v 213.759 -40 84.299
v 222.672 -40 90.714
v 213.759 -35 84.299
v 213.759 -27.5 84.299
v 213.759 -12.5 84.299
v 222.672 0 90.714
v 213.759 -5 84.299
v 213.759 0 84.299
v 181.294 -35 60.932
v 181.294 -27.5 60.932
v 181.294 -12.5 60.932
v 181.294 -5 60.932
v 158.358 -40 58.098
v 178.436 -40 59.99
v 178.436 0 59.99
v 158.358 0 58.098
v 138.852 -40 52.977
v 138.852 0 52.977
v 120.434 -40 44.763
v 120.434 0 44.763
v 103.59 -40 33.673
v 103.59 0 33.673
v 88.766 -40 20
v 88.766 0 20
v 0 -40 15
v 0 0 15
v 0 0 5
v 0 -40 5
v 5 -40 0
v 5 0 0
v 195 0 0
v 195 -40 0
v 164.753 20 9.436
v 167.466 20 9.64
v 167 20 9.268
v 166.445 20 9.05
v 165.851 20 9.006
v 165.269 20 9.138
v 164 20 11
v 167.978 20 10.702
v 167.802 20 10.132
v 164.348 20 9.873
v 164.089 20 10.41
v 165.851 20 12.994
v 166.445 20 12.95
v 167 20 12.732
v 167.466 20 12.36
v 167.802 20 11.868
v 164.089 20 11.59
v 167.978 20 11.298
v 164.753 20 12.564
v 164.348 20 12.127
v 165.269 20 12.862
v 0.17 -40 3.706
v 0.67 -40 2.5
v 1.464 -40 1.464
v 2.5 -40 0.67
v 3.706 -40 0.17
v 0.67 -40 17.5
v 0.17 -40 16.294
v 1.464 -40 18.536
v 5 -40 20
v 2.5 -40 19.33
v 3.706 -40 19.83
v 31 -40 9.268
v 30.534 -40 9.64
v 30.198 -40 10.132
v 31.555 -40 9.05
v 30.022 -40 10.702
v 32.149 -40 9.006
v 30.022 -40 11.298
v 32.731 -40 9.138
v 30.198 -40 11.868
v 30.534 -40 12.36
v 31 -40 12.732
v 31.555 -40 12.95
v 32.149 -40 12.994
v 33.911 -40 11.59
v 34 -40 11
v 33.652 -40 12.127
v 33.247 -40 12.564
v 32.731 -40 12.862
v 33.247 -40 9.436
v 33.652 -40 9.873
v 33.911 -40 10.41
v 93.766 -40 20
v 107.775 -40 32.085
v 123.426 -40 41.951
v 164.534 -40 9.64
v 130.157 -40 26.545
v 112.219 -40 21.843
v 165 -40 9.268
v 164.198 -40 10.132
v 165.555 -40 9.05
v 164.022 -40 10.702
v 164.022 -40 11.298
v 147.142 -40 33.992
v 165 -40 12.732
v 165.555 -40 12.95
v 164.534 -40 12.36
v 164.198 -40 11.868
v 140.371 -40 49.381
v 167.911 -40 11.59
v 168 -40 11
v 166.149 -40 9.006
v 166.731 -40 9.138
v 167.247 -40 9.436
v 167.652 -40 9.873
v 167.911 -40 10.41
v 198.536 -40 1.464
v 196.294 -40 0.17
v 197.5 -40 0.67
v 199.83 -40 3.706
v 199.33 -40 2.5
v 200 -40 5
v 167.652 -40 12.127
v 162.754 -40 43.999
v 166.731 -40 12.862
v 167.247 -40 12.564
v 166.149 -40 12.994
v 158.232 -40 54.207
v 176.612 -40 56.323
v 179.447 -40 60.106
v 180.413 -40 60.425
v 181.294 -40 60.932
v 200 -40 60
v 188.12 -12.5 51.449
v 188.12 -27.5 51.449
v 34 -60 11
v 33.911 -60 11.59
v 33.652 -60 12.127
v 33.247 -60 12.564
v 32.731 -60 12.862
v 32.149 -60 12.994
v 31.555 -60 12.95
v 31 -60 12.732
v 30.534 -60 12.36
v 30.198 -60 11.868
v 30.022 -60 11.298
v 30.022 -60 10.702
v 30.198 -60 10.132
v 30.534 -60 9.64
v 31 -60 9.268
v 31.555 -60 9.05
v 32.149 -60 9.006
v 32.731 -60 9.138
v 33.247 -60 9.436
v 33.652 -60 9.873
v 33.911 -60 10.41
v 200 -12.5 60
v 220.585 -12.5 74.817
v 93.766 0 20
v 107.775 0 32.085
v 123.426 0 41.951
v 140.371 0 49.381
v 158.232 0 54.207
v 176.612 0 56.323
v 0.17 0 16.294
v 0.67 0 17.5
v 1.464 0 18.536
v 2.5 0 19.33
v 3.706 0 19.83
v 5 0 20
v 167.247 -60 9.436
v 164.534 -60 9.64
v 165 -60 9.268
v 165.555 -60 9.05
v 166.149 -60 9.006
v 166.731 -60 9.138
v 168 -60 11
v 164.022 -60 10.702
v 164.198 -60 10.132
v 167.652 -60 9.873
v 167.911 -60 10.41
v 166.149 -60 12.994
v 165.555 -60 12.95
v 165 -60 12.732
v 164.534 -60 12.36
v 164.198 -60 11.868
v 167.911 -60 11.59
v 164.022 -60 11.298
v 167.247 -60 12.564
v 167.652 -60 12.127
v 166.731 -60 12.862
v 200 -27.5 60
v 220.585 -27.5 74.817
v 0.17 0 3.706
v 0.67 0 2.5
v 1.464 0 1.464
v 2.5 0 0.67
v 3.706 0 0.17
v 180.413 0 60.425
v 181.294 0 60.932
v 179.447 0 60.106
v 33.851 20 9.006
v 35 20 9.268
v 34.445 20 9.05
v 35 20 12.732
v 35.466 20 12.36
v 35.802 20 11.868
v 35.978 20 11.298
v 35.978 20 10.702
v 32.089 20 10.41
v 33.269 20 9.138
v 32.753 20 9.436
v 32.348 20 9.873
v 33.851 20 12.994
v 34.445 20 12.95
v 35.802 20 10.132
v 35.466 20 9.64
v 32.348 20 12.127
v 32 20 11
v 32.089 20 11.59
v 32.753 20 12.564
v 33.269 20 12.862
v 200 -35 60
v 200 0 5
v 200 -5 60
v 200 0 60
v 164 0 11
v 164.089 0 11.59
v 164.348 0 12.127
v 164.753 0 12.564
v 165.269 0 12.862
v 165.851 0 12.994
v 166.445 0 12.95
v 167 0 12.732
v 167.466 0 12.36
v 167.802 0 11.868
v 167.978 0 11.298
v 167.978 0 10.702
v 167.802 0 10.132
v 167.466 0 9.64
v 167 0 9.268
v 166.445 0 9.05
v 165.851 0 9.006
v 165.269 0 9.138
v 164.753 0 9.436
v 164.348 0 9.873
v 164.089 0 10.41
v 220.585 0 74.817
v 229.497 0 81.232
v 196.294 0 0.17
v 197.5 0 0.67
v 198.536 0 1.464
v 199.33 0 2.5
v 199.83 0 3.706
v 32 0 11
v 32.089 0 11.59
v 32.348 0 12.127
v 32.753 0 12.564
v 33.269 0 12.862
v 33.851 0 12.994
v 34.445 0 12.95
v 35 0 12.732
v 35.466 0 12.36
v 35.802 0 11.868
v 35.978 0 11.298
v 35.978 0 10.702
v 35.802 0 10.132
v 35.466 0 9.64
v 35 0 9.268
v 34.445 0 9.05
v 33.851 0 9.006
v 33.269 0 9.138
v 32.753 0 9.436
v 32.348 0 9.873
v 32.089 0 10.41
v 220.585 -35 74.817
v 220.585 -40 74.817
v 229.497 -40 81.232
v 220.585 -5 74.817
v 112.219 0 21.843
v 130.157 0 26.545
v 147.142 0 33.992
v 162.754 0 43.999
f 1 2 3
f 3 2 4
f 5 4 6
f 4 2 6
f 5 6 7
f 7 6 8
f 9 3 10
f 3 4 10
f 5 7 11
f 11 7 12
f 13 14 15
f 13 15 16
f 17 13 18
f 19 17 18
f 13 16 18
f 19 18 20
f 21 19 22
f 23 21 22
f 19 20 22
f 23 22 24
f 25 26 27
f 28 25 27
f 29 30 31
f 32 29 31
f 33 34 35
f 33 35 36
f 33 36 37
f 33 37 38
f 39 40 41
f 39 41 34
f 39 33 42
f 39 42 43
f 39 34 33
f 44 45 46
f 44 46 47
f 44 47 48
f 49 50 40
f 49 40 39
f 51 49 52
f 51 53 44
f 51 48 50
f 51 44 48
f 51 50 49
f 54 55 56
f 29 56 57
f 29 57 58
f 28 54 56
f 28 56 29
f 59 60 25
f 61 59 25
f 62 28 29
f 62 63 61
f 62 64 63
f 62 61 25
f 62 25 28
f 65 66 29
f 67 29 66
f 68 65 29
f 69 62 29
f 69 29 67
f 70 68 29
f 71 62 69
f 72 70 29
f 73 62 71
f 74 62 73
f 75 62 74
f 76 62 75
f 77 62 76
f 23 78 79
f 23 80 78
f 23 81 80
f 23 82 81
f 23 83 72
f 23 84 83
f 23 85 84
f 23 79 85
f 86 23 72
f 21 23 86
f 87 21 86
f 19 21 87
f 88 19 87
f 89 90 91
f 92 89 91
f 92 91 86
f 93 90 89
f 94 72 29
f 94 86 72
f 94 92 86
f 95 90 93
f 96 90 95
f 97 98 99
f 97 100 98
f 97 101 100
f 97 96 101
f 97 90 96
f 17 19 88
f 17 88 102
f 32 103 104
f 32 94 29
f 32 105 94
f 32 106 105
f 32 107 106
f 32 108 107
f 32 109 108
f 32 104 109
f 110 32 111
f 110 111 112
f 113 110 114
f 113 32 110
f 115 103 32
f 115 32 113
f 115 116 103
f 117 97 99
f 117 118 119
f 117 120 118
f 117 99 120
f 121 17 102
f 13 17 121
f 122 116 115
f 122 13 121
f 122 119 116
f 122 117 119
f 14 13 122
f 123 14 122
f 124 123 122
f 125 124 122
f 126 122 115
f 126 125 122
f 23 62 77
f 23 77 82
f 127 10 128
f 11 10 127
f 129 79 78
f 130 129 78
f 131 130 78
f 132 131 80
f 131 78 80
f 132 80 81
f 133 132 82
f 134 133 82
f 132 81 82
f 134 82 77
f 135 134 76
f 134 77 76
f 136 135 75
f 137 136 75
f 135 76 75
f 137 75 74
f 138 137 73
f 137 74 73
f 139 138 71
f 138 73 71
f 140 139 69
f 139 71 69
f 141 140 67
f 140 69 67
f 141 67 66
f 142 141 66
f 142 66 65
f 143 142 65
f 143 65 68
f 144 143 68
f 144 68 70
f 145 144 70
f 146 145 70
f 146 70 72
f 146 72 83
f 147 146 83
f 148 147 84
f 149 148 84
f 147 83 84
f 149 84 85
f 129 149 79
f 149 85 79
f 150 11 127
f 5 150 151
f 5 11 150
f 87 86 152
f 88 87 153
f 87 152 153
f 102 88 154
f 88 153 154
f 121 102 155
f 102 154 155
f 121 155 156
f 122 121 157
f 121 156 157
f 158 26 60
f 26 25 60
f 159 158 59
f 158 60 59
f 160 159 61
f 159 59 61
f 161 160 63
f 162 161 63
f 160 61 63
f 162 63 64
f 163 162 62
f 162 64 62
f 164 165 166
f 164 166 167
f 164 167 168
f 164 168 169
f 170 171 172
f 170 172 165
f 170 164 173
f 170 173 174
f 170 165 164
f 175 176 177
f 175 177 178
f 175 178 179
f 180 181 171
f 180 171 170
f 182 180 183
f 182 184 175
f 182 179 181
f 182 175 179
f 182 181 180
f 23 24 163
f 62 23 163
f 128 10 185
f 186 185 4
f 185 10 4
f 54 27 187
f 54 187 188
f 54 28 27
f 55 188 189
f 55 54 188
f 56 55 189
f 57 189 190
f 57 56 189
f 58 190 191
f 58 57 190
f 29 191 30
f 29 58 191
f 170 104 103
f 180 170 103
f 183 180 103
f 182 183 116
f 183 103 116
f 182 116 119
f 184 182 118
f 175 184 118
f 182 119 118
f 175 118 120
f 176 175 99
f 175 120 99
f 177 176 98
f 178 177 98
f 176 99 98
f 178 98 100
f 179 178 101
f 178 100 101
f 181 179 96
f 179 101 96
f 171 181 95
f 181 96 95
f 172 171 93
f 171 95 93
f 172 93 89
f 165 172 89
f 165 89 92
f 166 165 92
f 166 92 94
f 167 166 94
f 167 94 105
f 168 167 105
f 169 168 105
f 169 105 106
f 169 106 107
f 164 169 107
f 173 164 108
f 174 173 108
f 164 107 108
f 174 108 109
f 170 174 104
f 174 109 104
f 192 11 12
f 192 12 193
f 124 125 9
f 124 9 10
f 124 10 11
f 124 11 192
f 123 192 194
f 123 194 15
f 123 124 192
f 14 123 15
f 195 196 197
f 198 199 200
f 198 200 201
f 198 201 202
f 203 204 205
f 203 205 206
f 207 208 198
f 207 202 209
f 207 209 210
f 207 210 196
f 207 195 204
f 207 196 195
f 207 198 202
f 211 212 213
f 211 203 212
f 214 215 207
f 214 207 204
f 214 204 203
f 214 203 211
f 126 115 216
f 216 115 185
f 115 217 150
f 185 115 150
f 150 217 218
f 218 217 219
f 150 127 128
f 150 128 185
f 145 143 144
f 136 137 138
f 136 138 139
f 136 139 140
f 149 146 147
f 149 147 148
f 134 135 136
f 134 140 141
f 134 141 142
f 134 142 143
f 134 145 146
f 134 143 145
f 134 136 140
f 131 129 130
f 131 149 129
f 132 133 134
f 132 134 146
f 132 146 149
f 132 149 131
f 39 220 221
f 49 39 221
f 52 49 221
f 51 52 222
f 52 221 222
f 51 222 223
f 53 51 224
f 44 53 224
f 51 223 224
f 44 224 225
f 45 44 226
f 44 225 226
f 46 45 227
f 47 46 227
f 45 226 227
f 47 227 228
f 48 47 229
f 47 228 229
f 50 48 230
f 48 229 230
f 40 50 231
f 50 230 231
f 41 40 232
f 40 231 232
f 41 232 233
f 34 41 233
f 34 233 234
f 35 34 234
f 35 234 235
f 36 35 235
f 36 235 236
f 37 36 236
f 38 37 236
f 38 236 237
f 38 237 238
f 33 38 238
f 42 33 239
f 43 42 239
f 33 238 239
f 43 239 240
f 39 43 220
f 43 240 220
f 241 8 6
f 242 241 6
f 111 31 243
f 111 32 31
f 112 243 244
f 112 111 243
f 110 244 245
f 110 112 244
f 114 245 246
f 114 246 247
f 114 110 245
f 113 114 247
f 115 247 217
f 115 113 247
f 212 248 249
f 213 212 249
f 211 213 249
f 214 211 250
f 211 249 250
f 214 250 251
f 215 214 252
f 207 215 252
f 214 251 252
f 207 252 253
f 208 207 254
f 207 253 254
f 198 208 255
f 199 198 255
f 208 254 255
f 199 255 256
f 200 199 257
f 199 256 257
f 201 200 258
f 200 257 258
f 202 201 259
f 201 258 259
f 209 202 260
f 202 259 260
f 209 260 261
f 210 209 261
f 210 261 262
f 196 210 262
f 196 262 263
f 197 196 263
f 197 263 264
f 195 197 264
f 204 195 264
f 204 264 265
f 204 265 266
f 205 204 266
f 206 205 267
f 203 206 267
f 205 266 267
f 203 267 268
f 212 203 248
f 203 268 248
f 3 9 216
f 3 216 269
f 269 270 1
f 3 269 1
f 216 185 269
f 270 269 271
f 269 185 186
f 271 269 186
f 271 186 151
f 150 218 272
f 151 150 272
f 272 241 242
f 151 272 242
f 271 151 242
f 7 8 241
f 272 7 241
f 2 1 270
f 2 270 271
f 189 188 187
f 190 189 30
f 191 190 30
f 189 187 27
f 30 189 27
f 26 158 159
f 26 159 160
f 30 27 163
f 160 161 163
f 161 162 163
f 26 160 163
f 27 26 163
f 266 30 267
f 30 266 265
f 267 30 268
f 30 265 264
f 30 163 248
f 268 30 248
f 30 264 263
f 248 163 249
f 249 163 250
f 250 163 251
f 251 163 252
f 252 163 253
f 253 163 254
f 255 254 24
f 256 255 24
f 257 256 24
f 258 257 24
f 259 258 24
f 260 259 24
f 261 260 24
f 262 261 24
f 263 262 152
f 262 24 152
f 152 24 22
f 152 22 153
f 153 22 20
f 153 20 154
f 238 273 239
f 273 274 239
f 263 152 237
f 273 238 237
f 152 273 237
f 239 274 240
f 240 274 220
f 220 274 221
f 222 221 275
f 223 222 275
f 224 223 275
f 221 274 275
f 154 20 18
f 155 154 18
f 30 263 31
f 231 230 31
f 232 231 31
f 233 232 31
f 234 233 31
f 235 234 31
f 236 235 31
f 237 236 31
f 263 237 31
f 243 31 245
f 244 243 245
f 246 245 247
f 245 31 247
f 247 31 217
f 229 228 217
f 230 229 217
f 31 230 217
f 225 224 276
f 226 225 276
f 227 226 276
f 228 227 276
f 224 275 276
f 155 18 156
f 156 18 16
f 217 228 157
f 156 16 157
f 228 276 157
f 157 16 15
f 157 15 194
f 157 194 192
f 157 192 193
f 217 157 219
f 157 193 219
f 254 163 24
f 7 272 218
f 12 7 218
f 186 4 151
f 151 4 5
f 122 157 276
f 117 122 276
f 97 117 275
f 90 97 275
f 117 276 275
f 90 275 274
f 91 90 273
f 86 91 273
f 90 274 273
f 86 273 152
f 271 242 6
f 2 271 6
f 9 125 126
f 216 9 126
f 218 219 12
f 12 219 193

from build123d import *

# Parameters (mm, degrees)
F1_DEPTH  = 40
F2_R      = 5
F7_DEPTH  = 5
F9_DEPTH  = 5
F10_W     = 40
F10_H     = 15
F11_DEPTH = 11.684
F3_R      = 2
F12_DEPTH = 20
F4_R      = 2
F13_DEPTH = 20


# Not quite as in the source:
# - two fillets or chamfers of one size are made in one step


with BuildPart() as f1:
    # F0 (on Front) → F1 (new body)
    with BuildSketch(Plane.XZ):
        with BuildLine():
            Line((0, 20), (0, 0))
            Line((0, 0), (200, 0))
            Line((200, 0), (200, 60))
            Line((200, 60), (180, 60))
            ThreePointArc((180, 60), (178.3255687097, 58.1433963871), (176.6122992708, 56.3225710381))
            ThreePointArc((176.6122992708, 56.3225710381), (138.7955155822, 29.9352120782), (93.7655988336, 20))
            ThreePointArc((93.7655988336, 20), (91.2655988336, 19.9735969417), (88.7655988336, 20))
            Line((88.7655988336, 20), (0, 20))
        make_face()
        with BuildLine():
            ThreePointArc((180, 60), (130.1910752068, 49.5607362037), (88.7655988336, 20))
            ThreePointArc((88.7655988336, 20), (91.2655988336, 19.9735969417), (93.7655988336, 20))
            ThreePointArc((93.7655988336, 20), (131.7599412204, 45.9823724222), (176.6122992708, 56.3225710381))
            ThreePointArc((176.6122992708, 56.3225710381), (178.3255687097, 58.1433963871), (180, 60))
        make_face()
        Polygon((180, 60), (200, 60), (229.4970817654, 81.2315874186), (222.6715144816, 90.714360058), align=None)
    extrude(amount=F1_DEPTH)

    # F2
    f2_edges = [f1.edges().sort_by_distance(p)[0] for p in [
        (0, -20, 20),
        (0, -20, 0),
        (200, -20, 0),
        (180, -20, 60),
    ]]
    fillet(f2_edges, radius=F2_R)

    # F6 (on face) → F7 (cut)
    with BuildSketch(Plane.XZ.offset(40)):
        Polygon((181.2943636671, 60.931664887), (200, 60), (220.5845981647, 74.8165062187), (213.7590308809, 84.2992788581), align=None)
    extrude(amount=-F7_DEPTH, mode=Mode.SUBTRACT)

    # F8 (on face) → F9 (cut)
    with BuildSketch(Plane(origin=(0, 0, 0), x_dir=(-1, 0, 0), z_dir=(0, 1, 0))):
        Polygon((-220.5845981647, 74.8165062187), (-200, 60), (-181.2943636671, 60.931664887), (-213.7590308809, 84.2992788581), align=None)
    extrude(amount=-F9_DEPTH, mode=Mode.SUBTRACT)

    # F10 (on face) → F11 (cut)
    with BuildSketch(Plane(origin=(32.9817876356, 0, -45.8216556055), x_dir=(0.8116166803, 0, 0.5841903493), z_dir=(-0.5841903493, 0, 0.8116166803))):
        with Locations((202.737220197, -20)):
            Rectangle(F10_W, F10_H)
    extrude(amount=-F11_DEPTH, mode=Mode.SUBTRACT)

    # F3 (on face) → F12 (join)
    with BuildSketch(Plane.XZ.offset(40)):
        with Locations((32, 11)):
            Circle(F3_R)
        with Locations((166, 11)):
            Circle(F3_R)
    extrude(amount=F12_DEPTH)

    # F4 (on face) → F13 (join)
    with BuildSketch(Plane(origin=(0, 0, 0), x_dir=(-1, 0, 0), z_dir=(0, 1, 0))):
        with Locations((-166, 11)):
            Circle(F4_R)
        with Locations((-34, 11)):
            Circle(F4_R)
    extrude(amount=F13_DEPTH)


solid = f1.part
